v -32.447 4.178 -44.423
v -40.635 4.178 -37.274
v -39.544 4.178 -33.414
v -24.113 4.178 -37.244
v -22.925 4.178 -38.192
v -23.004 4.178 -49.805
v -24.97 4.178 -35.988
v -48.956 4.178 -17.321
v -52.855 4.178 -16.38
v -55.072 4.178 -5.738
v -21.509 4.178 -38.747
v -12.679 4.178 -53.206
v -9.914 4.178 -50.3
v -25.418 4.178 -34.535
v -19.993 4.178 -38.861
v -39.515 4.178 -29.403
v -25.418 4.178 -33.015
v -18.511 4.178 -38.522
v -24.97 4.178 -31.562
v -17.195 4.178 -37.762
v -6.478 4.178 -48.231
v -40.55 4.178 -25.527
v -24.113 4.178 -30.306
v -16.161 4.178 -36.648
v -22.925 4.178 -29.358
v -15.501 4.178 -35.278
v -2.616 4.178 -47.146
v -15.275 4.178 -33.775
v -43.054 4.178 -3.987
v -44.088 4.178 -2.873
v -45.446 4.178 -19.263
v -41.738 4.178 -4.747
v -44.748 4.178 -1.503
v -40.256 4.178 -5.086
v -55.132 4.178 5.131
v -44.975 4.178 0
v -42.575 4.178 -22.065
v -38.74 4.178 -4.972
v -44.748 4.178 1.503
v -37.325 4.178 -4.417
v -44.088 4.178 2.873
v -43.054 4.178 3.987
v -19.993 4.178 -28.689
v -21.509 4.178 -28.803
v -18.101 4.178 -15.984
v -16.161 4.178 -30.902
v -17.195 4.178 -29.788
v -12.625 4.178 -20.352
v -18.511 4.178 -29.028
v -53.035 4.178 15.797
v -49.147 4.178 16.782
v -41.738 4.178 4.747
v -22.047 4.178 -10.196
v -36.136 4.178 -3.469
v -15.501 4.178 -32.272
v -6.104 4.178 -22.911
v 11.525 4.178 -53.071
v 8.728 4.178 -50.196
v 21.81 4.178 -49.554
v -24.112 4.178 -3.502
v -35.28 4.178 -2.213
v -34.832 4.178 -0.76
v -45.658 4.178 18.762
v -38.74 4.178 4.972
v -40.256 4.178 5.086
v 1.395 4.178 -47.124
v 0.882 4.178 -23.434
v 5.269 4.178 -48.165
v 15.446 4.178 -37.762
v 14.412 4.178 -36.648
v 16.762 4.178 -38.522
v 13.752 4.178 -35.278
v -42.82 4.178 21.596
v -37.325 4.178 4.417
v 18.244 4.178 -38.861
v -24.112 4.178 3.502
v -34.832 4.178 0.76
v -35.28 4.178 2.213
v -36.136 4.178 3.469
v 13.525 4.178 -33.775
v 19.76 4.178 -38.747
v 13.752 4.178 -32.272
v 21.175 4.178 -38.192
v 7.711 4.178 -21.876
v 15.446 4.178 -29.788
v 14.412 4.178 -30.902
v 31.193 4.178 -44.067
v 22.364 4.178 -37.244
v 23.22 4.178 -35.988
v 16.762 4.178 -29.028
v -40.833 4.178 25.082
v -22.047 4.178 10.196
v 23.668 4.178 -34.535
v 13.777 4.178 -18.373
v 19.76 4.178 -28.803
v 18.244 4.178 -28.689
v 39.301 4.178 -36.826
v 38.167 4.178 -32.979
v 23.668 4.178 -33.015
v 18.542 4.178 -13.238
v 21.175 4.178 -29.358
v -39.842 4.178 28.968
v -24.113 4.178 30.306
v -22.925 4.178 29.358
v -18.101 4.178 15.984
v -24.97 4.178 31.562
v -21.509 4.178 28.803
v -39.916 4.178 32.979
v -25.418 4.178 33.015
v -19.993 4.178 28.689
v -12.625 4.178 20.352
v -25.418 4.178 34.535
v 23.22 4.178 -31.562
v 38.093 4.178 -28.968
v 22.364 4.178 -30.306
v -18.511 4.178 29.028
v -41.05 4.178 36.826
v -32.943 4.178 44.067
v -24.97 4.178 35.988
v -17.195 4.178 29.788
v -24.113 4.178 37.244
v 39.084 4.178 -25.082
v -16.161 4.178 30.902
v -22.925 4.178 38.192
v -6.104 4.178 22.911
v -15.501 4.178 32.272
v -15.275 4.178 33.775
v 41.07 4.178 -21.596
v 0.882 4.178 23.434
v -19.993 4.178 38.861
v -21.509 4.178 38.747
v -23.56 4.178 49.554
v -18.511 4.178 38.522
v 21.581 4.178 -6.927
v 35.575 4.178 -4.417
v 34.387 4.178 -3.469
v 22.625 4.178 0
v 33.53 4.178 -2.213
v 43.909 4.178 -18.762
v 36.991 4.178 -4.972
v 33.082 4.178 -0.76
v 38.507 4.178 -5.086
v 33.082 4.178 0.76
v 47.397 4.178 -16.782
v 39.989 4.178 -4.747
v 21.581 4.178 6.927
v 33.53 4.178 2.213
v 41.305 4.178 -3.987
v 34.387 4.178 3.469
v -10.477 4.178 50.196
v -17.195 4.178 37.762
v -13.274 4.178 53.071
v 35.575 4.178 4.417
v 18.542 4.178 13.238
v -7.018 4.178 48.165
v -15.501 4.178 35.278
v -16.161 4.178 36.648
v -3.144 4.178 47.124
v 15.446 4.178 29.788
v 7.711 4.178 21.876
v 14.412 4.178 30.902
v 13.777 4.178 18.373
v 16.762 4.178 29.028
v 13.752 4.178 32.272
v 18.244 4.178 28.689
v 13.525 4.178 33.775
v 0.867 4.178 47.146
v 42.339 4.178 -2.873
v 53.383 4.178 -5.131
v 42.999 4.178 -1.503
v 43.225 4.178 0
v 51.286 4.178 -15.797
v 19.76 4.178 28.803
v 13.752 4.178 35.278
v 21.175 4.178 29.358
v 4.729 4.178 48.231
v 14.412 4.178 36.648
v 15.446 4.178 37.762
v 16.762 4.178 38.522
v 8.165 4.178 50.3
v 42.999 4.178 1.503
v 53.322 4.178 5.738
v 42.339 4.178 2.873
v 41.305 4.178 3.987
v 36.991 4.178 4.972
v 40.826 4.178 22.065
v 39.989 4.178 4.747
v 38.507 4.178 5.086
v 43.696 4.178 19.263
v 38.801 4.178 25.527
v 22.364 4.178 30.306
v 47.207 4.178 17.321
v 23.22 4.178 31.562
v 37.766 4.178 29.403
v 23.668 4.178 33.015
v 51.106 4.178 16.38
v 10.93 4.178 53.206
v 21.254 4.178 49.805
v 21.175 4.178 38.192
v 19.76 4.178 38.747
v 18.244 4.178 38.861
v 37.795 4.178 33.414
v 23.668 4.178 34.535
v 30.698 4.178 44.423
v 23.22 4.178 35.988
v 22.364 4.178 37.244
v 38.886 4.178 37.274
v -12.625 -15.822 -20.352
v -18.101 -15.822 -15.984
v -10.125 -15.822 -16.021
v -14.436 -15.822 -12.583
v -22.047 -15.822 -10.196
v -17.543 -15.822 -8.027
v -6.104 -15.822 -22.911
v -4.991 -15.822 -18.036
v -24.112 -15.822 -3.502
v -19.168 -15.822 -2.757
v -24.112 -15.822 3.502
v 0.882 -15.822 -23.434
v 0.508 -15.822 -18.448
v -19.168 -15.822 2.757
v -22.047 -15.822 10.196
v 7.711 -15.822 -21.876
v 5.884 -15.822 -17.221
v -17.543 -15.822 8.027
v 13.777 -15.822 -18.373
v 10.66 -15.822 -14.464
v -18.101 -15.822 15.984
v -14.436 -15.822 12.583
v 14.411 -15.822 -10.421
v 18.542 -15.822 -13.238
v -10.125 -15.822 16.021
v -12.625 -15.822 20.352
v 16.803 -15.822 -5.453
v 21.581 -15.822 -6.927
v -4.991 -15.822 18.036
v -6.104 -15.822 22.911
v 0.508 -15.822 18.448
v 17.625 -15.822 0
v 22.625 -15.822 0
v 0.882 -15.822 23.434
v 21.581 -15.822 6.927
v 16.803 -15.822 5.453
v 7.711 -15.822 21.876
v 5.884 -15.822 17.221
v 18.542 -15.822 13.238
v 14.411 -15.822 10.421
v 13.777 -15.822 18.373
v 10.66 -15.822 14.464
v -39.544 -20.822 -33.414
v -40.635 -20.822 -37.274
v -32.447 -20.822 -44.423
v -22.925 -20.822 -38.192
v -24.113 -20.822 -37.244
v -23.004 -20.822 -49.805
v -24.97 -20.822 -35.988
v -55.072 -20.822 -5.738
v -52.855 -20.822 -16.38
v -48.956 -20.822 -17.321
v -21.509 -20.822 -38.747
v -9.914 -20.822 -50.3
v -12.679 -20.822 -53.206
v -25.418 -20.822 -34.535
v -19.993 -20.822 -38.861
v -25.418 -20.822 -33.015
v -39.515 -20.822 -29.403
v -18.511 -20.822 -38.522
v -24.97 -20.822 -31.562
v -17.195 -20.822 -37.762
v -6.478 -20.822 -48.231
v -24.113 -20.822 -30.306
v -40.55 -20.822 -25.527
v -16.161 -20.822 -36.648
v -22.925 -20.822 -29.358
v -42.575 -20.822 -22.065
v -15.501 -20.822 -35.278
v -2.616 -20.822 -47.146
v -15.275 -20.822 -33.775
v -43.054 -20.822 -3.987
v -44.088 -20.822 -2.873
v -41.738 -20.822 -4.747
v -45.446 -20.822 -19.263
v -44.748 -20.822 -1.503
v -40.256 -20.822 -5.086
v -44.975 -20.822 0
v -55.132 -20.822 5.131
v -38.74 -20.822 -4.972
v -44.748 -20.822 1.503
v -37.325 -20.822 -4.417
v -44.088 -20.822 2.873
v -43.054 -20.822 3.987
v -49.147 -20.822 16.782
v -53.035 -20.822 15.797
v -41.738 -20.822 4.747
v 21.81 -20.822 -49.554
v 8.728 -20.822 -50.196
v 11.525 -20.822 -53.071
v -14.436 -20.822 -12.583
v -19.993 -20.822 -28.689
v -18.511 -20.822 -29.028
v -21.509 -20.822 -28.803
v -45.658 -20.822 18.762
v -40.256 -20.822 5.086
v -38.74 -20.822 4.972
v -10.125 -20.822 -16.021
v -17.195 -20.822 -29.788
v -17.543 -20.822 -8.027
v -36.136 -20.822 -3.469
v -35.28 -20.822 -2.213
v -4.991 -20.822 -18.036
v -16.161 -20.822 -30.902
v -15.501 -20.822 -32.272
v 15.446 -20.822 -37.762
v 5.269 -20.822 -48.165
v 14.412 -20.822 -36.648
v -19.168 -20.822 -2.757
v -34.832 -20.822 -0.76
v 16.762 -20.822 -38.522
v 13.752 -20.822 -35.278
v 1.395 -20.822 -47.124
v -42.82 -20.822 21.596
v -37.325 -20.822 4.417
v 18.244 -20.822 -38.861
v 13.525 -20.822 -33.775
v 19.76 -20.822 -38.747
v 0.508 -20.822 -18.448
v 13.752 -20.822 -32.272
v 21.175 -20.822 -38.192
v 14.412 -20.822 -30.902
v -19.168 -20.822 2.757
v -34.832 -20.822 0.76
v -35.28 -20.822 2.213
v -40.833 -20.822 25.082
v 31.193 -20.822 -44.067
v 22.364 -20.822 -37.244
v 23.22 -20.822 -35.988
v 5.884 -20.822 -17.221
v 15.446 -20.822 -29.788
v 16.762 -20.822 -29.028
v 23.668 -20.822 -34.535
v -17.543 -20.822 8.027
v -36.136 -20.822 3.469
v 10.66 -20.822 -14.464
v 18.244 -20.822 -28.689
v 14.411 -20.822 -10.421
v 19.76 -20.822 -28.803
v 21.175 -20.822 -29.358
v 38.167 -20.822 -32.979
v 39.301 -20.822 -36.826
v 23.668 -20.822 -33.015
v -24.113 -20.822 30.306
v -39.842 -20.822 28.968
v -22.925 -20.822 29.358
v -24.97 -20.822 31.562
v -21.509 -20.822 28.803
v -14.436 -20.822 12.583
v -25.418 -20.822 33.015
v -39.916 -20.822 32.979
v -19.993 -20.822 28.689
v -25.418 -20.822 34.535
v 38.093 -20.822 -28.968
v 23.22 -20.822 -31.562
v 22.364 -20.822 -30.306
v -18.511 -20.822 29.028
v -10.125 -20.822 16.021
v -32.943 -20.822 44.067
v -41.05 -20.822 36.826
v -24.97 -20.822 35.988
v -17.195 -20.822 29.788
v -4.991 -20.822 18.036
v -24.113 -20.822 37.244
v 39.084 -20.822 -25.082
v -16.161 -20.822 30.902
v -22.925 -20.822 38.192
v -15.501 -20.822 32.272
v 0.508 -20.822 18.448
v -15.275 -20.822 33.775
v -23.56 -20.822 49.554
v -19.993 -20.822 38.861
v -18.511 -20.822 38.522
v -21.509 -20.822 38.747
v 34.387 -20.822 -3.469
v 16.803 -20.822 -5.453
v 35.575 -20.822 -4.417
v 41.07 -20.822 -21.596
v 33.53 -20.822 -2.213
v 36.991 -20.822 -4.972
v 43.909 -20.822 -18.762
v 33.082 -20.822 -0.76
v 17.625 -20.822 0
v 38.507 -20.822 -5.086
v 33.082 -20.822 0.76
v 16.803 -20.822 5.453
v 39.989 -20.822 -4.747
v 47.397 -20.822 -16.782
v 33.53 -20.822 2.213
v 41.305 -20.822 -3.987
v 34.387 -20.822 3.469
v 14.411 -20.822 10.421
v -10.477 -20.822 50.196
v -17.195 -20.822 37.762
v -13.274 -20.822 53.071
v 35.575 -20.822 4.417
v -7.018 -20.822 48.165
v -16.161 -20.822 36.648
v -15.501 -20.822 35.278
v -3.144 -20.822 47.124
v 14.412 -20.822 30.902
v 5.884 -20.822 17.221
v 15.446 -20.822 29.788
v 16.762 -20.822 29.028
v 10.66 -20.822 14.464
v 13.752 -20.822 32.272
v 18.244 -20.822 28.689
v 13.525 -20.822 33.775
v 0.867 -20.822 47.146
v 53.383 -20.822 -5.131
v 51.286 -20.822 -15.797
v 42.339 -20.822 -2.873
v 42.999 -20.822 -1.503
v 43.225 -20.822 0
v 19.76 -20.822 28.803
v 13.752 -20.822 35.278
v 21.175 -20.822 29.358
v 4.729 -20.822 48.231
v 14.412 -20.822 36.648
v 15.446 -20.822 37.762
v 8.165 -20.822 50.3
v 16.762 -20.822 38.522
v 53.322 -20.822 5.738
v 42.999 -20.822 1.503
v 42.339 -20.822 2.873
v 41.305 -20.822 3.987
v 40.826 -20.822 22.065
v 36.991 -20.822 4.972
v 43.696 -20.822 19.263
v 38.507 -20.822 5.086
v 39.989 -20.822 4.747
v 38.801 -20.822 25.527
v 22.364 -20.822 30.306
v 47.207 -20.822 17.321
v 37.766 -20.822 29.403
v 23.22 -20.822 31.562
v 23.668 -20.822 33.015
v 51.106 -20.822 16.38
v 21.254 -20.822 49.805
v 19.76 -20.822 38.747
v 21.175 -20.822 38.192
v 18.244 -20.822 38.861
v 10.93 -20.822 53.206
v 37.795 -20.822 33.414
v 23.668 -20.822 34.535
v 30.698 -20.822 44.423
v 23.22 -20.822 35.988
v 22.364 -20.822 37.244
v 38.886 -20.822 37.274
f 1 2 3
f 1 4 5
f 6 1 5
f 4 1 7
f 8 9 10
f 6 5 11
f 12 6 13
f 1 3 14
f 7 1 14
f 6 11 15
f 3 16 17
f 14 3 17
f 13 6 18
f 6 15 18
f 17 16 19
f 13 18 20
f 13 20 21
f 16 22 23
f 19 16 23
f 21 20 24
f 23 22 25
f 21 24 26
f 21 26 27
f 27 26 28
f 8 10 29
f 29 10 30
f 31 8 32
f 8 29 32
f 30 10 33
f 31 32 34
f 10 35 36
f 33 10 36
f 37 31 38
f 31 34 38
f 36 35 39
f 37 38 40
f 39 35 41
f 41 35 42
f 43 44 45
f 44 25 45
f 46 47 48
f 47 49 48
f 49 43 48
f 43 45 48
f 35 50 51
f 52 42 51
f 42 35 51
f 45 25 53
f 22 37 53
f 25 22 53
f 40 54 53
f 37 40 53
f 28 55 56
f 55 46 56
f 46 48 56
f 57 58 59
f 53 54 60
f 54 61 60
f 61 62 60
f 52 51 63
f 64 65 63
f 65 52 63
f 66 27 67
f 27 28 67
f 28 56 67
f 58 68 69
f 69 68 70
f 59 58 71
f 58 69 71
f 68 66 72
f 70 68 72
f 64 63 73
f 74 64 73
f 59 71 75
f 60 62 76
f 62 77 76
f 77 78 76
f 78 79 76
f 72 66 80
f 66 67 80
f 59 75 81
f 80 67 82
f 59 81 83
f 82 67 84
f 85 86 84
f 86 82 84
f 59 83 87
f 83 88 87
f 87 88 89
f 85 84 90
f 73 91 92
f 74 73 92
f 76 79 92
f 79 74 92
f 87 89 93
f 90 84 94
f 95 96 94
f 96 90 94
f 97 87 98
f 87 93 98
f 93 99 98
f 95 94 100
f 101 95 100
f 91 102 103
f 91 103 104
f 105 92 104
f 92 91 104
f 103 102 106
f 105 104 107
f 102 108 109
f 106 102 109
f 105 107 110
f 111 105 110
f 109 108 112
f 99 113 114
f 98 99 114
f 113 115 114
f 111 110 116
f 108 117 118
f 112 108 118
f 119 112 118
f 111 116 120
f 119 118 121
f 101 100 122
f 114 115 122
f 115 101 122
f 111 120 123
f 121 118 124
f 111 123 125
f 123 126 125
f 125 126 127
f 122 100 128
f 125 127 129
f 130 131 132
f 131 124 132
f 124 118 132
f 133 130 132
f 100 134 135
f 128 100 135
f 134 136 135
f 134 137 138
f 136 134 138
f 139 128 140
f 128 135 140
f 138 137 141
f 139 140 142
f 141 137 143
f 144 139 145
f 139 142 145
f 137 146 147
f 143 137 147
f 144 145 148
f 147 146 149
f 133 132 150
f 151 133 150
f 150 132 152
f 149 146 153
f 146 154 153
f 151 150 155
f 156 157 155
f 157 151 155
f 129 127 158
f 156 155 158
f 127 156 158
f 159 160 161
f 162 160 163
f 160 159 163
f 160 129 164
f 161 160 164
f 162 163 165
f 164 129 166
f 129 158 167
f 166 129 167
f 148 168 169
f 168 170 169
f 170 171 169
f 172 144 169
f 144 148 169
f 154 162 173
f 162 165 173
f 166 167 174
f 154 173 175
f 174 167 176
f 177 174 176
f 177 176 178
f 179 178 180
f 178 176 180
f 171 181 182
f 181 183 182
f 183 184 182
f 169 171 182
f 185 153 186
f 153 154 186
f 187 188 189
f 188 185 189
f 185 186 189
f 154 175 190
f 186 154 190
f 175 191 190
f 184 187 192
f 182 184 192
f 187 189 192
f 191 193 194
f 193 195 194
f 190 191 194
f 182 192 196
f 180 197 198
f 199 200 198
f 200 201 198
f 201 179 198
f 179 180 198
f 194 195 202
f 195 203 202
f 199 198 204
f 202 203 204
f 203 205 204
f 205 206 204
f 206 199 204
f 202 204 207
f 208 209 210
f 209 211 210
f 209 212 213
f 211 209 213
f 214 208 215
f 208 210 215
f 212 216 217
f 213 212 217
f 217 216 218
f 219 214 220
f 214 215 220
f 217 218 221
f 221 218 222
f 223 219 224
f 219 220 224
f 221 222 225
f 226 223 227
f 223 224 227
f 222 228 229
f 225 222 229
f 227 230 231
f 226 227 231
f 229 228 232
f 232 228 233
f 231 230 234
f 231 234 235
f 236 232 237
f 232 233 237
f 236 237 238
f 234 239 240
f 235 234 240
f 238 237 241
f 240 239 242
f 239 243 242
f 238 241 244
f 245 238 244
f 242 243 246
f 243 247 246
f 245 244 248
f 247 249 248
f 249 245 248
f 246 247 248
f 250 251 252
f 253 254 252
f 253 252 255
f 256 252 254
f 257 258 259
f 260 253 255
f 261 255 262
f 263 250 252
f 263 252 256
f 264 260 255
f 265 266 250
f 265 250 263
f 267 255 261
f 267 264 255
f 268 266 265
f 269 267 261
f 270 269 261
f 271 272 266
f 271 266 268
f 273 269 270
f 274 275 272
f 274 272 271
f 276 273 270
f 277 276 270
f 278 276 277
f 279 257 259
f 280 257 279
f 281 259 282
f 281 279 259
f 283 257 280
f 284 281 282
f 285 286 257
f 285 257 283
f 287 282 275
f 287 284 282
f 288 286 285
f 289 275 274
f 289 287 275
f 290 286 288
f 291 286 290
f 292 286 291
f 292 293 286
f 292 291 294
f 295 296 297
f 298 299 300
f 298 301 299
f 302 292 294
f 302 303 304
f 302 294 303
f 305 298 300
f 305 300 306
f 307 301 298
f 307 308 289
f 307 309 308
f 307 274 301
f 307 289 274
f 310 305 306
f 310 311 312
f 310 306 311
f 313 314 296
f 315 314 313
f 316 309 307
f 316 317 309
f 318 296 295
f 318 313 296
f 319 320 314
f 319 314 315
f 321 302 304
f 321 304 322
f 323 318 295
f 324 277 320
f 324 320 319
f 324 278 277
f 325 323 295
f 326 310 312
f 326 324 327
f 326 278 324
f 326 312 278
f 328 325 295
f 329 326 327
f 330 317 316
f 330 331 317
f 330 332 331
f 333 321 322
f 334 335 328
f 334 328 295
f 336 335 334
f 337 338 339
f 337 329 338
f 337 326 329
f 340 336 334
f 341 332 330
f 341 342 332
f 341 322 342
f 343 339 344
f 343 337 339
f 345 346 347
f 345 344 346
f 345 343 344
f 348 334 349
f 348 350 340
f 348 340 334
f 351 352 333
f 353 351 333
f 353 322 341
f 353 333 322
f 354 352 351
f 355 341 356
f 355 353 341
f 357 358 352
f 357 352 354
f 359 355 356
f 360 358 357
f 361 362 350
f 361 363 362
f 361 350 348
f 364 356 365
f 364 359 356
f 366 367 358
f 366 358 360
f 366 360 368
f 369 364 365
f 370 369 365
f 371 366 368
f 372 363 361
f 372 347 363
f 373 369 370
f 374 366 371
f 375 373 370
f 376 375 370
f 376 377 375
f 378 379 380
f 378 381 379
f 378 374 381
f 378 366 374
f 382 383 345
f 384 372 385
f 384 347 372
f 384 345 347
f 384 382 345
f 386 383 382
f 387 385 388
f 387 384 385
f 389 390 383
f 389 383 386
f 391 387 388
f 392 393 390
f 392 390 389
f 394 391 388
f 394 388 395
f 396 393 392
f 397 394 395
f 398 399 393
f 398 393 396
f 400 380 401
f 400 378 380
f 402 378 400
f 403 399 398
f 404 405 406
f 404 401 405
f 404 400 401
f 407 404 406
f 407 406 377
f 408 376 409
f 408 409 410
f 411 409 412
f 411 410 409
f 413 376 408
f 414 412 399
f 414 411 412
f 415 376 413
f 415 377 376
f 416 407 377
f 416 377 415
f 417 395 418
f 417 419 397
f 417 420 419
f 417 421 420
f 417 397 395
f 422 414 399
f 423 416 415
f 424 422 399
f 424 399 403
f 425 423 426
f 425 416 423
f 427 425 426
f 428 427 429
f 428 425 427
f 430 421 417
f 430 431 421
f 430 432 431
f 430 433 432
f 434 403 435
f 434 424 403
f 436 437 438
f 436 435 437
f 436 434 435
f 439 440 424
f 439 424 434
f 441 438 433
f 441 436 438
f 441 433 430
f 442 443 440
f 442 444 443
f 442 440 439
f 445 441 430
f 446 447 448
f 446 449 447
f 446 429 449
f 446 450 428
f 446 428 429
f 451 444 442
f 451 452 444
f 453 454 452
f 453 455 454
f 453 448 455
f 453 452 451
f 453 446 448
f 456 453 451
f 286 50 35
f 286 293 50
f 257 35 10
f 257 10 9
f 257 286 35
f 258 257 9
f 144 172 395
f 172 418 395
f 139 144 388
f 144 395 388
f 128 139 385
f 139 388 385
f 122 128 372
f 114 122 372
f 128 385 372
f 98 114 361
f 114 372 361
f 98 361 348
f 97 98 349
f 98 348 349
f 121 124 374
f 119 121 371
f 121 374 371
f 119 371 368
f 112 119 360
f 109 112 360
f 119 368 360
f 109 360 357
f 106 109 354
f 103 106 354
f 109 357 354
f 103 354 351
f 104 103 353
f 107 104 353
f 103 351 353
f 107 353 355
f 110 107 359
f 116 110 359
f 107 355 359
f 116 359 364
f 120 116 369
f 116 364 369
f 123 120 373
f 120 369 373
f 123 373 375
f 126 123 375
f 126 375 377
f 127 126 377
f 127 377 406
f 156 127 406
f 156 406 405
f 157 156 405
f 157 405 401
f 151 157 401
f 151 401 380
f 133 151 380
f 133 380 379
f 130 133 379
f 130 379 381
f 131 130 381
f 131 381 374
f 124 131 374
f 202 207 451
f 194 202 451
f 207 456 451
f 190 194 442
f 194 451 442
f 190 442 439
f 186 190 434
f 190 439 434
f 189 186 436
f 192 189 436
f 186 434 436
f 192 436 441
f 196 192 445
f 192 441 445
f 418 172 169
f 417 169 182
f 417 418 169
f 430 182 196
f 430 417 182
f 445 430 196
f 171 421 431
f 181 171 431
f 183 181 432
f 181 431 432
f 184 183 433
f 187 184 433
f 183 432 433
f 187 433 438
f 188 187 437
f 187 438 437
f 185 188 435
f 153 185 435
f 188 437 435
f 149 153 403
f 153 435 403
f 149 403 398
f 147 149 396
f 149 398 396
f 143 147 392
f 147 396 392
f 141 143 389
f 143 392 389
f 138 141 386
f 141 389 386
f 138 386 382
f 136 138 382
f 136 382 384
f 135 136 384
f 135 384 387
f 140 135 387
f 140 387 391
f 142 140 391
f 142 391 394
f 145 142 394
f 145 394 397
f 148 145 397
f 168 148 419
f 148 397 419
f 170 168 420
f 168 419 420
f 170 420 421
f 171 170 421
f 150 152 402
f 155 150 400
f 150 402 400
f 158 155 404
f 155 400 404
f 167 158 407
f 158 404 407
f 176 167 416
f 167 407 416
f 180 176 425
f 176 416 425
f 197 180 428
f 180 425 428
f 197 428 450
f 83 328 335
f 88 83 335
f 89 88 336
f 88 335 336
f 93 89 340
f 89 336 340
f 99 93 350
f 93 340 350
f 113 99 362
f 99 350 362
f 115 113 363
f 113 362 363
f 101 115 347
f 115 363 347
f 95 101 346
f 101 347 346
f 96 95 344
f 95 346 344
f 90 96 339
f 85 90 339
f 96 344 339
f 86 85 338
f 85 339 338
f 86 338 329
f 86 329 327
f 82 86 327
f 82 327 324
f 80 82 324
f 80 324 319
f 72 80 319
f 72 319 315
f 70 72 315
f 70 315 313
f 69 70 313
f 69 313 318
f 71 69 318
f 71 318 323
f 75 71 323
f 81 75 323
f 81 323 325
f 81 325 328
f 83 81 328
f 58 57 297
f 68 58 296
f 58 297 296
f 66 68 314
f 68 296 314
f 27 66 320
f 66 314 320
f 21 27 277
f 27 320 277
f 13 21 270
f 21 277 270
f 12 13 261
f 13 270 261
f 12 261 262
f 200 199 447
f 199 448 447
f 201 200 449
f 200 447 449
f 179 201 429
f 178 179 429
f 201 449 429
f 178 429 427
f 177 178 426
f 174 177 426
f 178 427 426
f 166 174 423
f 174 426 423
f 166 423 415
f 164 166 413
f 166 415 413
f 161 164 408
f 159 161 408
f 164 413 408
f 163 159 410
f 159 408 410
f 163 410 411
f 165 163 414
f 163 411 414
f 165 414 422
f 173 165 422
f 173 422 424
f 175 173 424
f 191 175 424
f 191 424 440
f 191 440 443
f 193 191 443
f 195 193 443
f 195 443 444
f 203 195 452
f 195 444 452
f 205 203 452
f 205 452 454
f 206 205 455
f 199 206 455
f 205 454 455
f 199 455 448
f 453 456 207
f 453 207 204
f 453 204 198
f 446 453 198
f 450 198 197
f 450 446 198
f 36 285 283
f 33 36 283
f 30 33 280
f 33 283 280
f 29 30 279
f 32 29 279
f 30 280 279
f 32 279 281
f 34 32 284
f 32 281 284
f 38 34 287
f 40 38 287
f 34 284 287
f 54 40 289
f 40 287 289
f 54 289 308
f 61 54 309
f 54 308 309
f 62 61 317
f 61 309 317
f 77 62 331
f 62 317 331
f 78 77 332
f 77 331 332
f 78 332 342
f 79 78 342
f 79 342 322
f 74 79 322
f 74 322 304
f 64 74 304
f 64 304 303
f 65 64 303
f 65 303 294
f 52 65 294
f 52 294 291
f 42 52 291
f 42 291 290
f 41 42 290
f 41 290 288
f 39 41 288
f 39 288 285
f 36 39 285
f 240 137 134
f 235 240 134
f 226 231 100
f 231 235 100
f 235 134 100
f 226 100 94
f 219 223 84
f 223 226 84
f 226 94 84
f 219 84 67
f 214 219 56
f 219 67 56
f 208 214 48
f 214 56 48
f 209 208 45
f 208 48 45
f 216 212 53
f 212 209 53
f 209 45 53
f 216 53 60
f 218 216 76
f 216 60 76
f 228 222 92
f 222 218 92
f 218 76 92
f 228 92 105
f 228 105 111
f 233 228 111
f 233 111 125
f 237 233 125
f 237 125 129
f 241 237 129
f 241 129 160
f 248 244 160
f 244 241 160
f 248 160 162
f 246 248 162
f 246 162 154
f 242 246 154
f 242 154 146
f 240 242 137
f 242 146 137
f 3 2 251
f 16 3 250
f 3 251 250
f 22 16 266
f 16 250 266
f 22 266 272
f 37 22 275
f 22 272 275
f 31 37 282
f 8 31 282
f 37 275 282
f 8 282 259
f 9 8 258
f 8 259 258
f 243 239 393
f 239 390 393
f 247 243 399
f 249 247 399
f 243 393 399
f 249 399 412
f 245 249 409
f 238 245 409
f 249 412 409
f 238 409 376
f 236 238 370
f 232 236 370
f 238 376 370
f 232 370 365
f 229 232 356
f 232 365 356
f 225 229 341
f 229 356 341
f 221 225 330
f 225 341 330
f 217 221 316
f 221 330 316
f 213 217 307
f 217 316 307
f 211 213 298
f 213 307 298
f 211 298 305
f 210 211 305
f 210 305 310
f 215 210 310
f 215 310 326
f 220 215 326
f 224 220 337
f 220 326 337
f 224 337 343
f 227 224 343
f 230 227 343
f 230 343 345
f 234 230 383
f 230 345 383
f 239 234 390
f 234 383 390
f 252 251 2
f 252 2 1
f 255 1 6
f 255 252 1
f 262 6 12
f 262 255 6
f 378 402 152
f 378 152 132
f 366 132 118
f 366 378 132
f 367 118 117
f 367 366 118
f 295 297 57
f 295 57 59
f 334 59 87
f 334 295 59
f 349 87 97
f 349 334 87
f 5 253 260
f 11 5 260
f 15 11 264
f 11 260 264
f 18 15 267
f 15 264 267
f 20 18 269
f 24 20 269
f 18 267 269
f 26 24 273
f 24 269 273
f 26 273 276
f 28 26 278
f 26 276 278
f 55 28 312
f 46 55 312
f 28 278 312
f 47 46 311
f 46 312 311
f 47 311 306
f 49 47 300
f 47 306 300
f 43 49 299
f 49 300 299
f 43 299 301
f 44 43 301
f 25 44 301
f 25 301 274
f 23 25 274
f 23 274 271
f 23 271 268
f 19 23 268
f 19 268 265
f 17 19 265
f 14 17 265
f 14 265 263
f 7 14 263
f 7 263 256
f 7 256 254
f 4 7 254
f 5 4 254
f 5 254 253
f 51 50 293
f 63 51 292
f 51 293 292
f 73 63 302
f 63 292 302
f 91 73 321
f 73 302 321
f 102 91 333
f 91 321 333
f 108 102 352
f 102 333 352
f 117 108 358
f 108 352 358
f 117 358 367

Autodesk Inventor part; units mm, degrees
ref_plane "YZ Plane" through (0, 0, 0) normal (1, 0, 0) x (0, 1, 0)
ref_plane "XZ Plane" through (0, 0, 0) normal (0, 1, 0) x (-1, 0, 0)
ref_plane "XY Plane" through (0, 0, 0) normal (0, 0, 1) x (1, 0, 0)
sketch "Sketch1" plane through (0, 0, 0) normal (0, 0, 1) x (1, 0, 0)
  line L0 (-0.8746, 32.779) -> (-0.8746, -34.5944)
  line L1 (22.6254, 4.1775) -> (53.6254, 4.1775)
  line L2 (53.6254, 4.1775) -> (53.6254, -20.8225)
  line L3 (53.6254, -20.8225) -> (22.6254, -20.8225)
  line L4 (22.6254, -20.8225) -> (22.6254, 4.1775)
  line L5 (38.1254, 4.1775) -> (38.1254, -20.8225)
  line L6 (38.1254, 15.3436) -> (43.2254, 15.3436)
  line L7 (43.2254, 15.3436) -> (43.2254, -23.8453)
  line L8 (43.2254, -23.8453) -> (38.1254, -23.8453)
  line L9 (38.1254, -23.8453) -> (38.1254, 15.3436)
  line L10 (22.6254, -15.8225) -> (17.6254, -15.8225)
  line L11 (17.6254, -15.8225) -> (17.6254, -20.8225)
  line L12 (17.6254, -20.8225) -> (22.6254, -20.8225)
  line L13 (22.6254, -20.8225) -> (22.6254, -15.8225)
  point P0 (0, 0)
  dimension "d0" = 47
  dimension "d1" = 25
  dimension "d3" = 39
  dimension "d5" = 10.2
  dimension "d7" = 5
  dimension "d8" = 5
revolve "Revolution1" add sketch "Sketch1" angle 360 about axis through (-0.8746, 32.779, 0) along (0, -1, 0) contours L1 L5 L3 L4 | L1 L7 L3 L5 | L1 L2 L3 L7
revolve "Revolution2" cut sketch "Sketch1" angle 360 about axis through (38.1254, -23.8453, 0) along (0, 1, 0) contours L9 L6 L7 L1 | L1 L7 L3 L5 | L3 L7 L8 L9
revolve "Revolution3" add sketch "Sketch1" angle 360 about axis through (-0.8746, 32.779, 0) along (0, -1, 0) contours L4 L12 L11 L10
pattern_circular "Circular Pattern1" count 6 over 360 about axis through (-0.8746, -8.3225, 0) along (0, -1, 0) of "Revolution2"
sketch "Sketch2" plane through (-0.8746, -20.8225, 0) normal (0, -1, 0) x (1, 0, 0)
  circle A0 centre (-0.347, 62) radius 15
  circle A1 centre (19.5, -33.775) radius 5.1 projected
  circle A2 centre (-19.5, -33.775) radius 5.1 projected
  circle A3 centre (-39, 0) radius 5.1 projected
  circle A4 centre (-19.5, 33.775) radius 5.1 projected
  circle A5 centre (19.5, 33.775) radius 5.1 projected
  circle A6 centre (0, 0) radius 18.5 projected
  circle A7 centre (39, 0) radius 5.1 projected
  circle A8 centre (0, 0) radius 54.5 projected
  point P0 (0.8746, 0)
  dimension "d13" = 62
  dimension "d14" = 30
extrude "Extrusion1" cut sketch "Sketch2" against normal through all contours A0 A8 | A8 A0 picked at (-0.731, 61.8812) picked at (-0.2905, 51.8983)
pattern_circular "Circular Pattern2" count 6 over 360 about axis through (-0.8746, -8.3225, 0) along (0, -1, 0) of "Extrusion1"
properties part number "HELP_6204BEARING_CASE_A"
